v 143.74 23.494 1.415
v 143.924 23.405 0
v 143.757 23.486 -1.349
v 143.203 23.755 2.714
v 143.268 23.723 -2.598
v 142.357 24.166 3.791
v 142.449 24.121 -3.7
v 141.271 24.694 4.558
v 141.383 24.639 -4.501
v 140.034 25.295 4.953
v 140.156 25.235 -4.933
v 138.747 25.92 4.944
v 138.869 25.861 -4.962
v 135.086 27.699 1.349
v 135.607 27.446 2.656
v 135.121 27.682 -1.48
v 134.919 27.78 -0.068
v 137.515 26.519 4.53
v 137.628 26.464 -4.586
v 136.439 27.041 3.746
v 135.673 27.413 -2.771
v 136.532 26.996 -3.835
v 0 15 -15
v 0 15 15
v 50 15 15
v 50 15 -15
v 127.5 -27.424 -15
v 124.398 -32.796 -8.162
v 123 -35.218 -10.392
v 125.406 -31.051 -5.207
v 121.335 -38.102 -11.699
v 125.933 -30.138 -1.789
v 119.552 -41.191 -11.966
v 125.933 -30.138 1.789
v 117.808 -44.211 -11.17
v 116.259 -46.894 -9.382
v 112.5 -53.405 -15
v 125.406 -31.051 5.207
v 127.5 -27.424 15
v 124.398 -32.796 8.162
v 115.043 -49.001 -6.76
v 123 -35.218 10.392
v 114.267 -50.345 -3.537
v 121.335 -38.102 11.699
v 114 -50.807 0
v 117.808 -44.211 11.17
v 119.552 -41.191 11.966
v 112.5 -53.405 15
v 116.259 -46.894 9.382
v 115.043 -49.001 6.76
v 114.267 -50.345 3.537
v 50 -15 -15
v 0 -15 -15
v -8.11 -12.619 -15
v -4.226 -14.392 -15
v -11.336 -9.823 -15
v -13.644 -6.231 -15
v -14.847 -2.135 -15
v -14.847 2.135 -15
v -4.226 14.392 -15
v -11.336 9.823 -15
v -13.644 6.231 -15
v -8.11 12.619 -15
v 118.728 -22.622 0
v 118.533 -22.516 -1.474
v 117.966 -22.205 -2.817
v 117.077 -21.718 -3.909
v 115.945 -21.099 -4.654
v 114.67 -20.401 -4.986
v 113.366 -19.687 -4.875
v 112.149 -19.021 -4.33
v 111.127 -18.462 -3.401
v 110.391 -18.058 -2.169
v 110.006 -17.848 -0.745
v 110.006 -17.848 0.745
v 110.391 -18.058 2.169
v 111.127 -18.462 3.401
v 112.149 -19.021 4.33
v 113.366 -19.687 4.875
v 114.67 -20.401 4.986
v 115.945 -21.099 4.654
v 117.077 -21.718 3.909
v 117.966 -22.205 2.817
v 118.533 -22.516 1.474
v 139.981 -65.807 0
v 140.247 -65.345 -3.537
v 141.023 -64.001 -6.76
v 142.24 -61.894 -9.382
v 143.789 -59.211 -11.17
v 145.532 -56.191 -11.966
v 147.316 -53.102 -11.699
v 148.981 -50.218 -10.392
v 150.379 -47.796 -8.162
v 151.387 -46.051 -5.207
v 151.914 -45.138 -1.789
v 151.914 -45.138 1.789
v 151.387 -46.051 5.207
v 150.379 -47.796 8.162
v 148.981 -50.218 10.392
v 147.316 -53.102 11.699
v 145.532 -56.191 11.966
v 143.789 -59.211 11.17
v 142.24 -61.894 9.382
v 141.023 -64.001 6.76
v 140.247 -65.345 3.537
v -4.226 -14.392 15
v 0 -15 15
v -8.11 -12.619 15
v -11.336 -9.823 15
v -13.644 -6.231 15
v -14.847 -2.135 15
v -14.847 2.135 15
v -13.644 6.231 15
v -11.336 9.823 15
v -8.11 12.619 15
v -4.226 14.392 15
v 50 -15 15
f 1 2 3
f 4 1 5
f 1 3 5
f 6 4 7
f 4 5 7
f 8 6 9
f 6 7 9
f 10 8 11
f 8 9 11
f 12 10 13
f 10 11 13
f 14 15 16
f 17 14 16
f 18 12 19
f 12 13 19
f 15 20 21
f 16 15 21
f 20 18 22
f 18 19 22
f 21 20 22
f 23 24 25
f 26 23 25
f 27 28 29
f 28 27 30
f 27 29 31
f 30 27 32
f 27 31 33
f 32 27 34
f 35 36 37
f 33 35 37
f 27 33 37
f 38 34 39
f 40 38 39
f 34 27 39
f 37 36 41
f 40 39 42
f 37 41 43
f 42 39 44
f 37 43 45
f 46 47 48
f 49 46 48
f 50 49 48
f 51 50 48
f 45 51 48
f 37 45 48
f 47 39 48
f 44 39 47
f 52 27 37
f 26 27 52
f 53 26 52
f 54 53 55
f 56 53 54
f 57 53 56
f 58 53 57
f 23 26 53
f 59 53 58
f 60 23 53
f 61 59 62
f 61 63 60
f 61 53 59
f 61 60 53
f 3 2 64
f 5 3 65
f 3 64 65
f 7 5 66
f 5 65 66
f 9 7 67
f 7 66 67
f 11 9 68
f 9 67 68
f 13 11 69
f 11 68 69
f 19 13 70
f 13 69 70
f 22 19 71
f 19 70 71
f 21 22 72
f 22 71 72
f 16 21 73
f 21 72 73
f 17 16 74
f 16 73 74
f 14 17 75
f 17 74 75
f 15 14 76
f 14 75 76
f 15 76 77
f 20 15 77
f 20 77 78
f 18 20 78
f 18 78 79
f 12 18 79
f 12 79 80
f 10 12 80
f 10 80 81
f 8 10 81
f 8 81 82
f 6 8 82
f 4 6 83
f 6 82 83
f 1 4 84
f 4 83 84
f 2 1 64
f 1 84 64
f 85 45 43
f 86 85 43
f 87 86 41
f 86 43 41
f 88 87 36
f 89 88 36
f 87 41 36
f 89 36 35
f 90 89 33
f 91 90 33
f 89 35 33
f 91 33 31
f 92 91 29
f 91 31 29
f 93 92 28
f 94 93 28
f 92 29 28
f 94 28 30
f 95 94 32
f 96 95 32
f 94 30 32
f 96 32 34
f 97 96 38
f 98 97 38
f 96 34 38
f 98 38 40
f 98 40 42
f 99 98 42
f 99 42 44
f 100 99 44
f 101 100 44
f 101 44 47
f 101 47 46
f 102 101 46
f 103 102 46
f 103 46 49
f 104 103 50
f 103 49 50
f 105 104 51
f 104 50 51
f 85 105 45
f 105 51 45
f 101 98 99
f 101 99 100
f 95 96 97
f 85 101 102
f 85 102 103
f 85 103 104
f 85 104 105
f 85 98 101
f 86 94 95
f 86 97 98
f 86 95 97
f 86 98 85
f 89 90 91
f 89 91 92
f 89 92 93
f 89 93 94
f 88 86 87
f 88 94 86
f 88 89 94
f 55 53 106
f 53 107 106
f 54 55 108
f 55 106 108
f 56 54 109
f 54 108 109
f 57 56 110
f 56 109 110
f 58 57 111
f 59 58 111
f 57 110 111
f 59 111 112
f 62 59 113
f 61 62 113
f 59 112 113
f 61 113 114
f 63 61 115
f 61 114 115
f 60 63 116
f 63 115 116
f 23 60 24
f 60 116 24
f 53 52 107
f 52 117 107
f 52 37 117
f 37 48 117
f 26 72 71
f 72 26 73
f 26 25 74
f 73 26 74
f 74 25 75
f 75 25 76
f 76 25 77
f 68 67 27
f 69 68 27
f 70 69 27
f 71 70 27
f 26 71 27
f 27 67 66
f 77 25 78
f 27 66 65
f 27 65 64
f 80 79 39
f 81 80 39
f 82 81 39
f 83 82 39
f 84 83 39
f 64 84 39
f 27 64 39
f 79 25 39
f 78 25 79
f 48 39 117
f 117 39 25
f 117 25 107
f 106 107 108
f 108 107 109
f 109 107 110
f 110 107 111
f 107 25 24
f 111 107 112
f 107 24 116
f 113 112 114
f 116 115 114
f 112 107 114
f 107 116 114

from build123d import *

# Parameters (mm, degrees)
BOSS_EXTRUDE1_DEPTH = 15
SKETCH4_R           = 12
BOSS_EXTRUDE2_DEPTH = 30
BOSS_EXTRUDE3_REACH = 169.037
SKETCH5_R           = 5


with BuildPart() as part:
    # Sketch1 → Boss-Extrude1 (new, symmetric)
    with BuildSketch(Plane.XY):
        with BuildLine():
            Line((127.5, -27.424137787), (112.5, -53.4048999))
            Line((112.5, -53.4048999), (50, -15))
            Line((50, -15), (0, -15))
            ThreePointArc((0, -15), (-15, 0), (0, 15))
            Line((0, 15), (50, 15))
            Line((50, 15), (127.5, -27.424137787))
        make_face()
    extrude(amount=BOSS_EXTRUDE1_DEPTH, both=True)

    # Sketch4 → Boss-Extrude2 (add)
    with BuildSketch(Plane(origin=(107.5, -62.065153938, 0), x_dir=(0, 0, -1), z_dir=(0.8660254037844382, -0.5000000000000008, 0))):
        with Locations(Location((0, 25, 0), (0, 0, 270))):
            Circle(SKETCH4_R)
    extrude(amount=BOSS_EXTRUDE2_DEPTH)

    # Boss-Extrude3: up to this plane
    boss_extrude3_end = Plane(origin=(122.500102159, 33.814123489, 15), z_dir=(-0.43702455737153567, -0.8994495740474913, 0))
    # Sketch5 → Boss-Extrude3 (add, up to the surface)
    with BuildSketch(Plane(origin=(17.846196254, 32.601256781, 0), x_dir=(0.877174161572964, -0.48017235475271564, 0), z_dir=(0.4801723547527156, 0.8771741615729639, 0)), mode=Mode.PRIVATE) as boss_extrude3_sk1:
        with Locations((110.008018419, 0)):
            Circle(SKETCH5_R)
    boss_extrude3_tool1 = split(extrude(boss_extrude3_sk1.sketch, amount=BOSS_EXTRUDE3_REACH, mode=Mode.PRIVATE), bisect_by=boss_extrude3_end, keep=Keep.BOTH, mode=Mode.PRIVATE)
    add(boss_extrude3_tool1.solids().sort_by_distance((114.342388, -20.221552, 0))[0])


solid = part.part
